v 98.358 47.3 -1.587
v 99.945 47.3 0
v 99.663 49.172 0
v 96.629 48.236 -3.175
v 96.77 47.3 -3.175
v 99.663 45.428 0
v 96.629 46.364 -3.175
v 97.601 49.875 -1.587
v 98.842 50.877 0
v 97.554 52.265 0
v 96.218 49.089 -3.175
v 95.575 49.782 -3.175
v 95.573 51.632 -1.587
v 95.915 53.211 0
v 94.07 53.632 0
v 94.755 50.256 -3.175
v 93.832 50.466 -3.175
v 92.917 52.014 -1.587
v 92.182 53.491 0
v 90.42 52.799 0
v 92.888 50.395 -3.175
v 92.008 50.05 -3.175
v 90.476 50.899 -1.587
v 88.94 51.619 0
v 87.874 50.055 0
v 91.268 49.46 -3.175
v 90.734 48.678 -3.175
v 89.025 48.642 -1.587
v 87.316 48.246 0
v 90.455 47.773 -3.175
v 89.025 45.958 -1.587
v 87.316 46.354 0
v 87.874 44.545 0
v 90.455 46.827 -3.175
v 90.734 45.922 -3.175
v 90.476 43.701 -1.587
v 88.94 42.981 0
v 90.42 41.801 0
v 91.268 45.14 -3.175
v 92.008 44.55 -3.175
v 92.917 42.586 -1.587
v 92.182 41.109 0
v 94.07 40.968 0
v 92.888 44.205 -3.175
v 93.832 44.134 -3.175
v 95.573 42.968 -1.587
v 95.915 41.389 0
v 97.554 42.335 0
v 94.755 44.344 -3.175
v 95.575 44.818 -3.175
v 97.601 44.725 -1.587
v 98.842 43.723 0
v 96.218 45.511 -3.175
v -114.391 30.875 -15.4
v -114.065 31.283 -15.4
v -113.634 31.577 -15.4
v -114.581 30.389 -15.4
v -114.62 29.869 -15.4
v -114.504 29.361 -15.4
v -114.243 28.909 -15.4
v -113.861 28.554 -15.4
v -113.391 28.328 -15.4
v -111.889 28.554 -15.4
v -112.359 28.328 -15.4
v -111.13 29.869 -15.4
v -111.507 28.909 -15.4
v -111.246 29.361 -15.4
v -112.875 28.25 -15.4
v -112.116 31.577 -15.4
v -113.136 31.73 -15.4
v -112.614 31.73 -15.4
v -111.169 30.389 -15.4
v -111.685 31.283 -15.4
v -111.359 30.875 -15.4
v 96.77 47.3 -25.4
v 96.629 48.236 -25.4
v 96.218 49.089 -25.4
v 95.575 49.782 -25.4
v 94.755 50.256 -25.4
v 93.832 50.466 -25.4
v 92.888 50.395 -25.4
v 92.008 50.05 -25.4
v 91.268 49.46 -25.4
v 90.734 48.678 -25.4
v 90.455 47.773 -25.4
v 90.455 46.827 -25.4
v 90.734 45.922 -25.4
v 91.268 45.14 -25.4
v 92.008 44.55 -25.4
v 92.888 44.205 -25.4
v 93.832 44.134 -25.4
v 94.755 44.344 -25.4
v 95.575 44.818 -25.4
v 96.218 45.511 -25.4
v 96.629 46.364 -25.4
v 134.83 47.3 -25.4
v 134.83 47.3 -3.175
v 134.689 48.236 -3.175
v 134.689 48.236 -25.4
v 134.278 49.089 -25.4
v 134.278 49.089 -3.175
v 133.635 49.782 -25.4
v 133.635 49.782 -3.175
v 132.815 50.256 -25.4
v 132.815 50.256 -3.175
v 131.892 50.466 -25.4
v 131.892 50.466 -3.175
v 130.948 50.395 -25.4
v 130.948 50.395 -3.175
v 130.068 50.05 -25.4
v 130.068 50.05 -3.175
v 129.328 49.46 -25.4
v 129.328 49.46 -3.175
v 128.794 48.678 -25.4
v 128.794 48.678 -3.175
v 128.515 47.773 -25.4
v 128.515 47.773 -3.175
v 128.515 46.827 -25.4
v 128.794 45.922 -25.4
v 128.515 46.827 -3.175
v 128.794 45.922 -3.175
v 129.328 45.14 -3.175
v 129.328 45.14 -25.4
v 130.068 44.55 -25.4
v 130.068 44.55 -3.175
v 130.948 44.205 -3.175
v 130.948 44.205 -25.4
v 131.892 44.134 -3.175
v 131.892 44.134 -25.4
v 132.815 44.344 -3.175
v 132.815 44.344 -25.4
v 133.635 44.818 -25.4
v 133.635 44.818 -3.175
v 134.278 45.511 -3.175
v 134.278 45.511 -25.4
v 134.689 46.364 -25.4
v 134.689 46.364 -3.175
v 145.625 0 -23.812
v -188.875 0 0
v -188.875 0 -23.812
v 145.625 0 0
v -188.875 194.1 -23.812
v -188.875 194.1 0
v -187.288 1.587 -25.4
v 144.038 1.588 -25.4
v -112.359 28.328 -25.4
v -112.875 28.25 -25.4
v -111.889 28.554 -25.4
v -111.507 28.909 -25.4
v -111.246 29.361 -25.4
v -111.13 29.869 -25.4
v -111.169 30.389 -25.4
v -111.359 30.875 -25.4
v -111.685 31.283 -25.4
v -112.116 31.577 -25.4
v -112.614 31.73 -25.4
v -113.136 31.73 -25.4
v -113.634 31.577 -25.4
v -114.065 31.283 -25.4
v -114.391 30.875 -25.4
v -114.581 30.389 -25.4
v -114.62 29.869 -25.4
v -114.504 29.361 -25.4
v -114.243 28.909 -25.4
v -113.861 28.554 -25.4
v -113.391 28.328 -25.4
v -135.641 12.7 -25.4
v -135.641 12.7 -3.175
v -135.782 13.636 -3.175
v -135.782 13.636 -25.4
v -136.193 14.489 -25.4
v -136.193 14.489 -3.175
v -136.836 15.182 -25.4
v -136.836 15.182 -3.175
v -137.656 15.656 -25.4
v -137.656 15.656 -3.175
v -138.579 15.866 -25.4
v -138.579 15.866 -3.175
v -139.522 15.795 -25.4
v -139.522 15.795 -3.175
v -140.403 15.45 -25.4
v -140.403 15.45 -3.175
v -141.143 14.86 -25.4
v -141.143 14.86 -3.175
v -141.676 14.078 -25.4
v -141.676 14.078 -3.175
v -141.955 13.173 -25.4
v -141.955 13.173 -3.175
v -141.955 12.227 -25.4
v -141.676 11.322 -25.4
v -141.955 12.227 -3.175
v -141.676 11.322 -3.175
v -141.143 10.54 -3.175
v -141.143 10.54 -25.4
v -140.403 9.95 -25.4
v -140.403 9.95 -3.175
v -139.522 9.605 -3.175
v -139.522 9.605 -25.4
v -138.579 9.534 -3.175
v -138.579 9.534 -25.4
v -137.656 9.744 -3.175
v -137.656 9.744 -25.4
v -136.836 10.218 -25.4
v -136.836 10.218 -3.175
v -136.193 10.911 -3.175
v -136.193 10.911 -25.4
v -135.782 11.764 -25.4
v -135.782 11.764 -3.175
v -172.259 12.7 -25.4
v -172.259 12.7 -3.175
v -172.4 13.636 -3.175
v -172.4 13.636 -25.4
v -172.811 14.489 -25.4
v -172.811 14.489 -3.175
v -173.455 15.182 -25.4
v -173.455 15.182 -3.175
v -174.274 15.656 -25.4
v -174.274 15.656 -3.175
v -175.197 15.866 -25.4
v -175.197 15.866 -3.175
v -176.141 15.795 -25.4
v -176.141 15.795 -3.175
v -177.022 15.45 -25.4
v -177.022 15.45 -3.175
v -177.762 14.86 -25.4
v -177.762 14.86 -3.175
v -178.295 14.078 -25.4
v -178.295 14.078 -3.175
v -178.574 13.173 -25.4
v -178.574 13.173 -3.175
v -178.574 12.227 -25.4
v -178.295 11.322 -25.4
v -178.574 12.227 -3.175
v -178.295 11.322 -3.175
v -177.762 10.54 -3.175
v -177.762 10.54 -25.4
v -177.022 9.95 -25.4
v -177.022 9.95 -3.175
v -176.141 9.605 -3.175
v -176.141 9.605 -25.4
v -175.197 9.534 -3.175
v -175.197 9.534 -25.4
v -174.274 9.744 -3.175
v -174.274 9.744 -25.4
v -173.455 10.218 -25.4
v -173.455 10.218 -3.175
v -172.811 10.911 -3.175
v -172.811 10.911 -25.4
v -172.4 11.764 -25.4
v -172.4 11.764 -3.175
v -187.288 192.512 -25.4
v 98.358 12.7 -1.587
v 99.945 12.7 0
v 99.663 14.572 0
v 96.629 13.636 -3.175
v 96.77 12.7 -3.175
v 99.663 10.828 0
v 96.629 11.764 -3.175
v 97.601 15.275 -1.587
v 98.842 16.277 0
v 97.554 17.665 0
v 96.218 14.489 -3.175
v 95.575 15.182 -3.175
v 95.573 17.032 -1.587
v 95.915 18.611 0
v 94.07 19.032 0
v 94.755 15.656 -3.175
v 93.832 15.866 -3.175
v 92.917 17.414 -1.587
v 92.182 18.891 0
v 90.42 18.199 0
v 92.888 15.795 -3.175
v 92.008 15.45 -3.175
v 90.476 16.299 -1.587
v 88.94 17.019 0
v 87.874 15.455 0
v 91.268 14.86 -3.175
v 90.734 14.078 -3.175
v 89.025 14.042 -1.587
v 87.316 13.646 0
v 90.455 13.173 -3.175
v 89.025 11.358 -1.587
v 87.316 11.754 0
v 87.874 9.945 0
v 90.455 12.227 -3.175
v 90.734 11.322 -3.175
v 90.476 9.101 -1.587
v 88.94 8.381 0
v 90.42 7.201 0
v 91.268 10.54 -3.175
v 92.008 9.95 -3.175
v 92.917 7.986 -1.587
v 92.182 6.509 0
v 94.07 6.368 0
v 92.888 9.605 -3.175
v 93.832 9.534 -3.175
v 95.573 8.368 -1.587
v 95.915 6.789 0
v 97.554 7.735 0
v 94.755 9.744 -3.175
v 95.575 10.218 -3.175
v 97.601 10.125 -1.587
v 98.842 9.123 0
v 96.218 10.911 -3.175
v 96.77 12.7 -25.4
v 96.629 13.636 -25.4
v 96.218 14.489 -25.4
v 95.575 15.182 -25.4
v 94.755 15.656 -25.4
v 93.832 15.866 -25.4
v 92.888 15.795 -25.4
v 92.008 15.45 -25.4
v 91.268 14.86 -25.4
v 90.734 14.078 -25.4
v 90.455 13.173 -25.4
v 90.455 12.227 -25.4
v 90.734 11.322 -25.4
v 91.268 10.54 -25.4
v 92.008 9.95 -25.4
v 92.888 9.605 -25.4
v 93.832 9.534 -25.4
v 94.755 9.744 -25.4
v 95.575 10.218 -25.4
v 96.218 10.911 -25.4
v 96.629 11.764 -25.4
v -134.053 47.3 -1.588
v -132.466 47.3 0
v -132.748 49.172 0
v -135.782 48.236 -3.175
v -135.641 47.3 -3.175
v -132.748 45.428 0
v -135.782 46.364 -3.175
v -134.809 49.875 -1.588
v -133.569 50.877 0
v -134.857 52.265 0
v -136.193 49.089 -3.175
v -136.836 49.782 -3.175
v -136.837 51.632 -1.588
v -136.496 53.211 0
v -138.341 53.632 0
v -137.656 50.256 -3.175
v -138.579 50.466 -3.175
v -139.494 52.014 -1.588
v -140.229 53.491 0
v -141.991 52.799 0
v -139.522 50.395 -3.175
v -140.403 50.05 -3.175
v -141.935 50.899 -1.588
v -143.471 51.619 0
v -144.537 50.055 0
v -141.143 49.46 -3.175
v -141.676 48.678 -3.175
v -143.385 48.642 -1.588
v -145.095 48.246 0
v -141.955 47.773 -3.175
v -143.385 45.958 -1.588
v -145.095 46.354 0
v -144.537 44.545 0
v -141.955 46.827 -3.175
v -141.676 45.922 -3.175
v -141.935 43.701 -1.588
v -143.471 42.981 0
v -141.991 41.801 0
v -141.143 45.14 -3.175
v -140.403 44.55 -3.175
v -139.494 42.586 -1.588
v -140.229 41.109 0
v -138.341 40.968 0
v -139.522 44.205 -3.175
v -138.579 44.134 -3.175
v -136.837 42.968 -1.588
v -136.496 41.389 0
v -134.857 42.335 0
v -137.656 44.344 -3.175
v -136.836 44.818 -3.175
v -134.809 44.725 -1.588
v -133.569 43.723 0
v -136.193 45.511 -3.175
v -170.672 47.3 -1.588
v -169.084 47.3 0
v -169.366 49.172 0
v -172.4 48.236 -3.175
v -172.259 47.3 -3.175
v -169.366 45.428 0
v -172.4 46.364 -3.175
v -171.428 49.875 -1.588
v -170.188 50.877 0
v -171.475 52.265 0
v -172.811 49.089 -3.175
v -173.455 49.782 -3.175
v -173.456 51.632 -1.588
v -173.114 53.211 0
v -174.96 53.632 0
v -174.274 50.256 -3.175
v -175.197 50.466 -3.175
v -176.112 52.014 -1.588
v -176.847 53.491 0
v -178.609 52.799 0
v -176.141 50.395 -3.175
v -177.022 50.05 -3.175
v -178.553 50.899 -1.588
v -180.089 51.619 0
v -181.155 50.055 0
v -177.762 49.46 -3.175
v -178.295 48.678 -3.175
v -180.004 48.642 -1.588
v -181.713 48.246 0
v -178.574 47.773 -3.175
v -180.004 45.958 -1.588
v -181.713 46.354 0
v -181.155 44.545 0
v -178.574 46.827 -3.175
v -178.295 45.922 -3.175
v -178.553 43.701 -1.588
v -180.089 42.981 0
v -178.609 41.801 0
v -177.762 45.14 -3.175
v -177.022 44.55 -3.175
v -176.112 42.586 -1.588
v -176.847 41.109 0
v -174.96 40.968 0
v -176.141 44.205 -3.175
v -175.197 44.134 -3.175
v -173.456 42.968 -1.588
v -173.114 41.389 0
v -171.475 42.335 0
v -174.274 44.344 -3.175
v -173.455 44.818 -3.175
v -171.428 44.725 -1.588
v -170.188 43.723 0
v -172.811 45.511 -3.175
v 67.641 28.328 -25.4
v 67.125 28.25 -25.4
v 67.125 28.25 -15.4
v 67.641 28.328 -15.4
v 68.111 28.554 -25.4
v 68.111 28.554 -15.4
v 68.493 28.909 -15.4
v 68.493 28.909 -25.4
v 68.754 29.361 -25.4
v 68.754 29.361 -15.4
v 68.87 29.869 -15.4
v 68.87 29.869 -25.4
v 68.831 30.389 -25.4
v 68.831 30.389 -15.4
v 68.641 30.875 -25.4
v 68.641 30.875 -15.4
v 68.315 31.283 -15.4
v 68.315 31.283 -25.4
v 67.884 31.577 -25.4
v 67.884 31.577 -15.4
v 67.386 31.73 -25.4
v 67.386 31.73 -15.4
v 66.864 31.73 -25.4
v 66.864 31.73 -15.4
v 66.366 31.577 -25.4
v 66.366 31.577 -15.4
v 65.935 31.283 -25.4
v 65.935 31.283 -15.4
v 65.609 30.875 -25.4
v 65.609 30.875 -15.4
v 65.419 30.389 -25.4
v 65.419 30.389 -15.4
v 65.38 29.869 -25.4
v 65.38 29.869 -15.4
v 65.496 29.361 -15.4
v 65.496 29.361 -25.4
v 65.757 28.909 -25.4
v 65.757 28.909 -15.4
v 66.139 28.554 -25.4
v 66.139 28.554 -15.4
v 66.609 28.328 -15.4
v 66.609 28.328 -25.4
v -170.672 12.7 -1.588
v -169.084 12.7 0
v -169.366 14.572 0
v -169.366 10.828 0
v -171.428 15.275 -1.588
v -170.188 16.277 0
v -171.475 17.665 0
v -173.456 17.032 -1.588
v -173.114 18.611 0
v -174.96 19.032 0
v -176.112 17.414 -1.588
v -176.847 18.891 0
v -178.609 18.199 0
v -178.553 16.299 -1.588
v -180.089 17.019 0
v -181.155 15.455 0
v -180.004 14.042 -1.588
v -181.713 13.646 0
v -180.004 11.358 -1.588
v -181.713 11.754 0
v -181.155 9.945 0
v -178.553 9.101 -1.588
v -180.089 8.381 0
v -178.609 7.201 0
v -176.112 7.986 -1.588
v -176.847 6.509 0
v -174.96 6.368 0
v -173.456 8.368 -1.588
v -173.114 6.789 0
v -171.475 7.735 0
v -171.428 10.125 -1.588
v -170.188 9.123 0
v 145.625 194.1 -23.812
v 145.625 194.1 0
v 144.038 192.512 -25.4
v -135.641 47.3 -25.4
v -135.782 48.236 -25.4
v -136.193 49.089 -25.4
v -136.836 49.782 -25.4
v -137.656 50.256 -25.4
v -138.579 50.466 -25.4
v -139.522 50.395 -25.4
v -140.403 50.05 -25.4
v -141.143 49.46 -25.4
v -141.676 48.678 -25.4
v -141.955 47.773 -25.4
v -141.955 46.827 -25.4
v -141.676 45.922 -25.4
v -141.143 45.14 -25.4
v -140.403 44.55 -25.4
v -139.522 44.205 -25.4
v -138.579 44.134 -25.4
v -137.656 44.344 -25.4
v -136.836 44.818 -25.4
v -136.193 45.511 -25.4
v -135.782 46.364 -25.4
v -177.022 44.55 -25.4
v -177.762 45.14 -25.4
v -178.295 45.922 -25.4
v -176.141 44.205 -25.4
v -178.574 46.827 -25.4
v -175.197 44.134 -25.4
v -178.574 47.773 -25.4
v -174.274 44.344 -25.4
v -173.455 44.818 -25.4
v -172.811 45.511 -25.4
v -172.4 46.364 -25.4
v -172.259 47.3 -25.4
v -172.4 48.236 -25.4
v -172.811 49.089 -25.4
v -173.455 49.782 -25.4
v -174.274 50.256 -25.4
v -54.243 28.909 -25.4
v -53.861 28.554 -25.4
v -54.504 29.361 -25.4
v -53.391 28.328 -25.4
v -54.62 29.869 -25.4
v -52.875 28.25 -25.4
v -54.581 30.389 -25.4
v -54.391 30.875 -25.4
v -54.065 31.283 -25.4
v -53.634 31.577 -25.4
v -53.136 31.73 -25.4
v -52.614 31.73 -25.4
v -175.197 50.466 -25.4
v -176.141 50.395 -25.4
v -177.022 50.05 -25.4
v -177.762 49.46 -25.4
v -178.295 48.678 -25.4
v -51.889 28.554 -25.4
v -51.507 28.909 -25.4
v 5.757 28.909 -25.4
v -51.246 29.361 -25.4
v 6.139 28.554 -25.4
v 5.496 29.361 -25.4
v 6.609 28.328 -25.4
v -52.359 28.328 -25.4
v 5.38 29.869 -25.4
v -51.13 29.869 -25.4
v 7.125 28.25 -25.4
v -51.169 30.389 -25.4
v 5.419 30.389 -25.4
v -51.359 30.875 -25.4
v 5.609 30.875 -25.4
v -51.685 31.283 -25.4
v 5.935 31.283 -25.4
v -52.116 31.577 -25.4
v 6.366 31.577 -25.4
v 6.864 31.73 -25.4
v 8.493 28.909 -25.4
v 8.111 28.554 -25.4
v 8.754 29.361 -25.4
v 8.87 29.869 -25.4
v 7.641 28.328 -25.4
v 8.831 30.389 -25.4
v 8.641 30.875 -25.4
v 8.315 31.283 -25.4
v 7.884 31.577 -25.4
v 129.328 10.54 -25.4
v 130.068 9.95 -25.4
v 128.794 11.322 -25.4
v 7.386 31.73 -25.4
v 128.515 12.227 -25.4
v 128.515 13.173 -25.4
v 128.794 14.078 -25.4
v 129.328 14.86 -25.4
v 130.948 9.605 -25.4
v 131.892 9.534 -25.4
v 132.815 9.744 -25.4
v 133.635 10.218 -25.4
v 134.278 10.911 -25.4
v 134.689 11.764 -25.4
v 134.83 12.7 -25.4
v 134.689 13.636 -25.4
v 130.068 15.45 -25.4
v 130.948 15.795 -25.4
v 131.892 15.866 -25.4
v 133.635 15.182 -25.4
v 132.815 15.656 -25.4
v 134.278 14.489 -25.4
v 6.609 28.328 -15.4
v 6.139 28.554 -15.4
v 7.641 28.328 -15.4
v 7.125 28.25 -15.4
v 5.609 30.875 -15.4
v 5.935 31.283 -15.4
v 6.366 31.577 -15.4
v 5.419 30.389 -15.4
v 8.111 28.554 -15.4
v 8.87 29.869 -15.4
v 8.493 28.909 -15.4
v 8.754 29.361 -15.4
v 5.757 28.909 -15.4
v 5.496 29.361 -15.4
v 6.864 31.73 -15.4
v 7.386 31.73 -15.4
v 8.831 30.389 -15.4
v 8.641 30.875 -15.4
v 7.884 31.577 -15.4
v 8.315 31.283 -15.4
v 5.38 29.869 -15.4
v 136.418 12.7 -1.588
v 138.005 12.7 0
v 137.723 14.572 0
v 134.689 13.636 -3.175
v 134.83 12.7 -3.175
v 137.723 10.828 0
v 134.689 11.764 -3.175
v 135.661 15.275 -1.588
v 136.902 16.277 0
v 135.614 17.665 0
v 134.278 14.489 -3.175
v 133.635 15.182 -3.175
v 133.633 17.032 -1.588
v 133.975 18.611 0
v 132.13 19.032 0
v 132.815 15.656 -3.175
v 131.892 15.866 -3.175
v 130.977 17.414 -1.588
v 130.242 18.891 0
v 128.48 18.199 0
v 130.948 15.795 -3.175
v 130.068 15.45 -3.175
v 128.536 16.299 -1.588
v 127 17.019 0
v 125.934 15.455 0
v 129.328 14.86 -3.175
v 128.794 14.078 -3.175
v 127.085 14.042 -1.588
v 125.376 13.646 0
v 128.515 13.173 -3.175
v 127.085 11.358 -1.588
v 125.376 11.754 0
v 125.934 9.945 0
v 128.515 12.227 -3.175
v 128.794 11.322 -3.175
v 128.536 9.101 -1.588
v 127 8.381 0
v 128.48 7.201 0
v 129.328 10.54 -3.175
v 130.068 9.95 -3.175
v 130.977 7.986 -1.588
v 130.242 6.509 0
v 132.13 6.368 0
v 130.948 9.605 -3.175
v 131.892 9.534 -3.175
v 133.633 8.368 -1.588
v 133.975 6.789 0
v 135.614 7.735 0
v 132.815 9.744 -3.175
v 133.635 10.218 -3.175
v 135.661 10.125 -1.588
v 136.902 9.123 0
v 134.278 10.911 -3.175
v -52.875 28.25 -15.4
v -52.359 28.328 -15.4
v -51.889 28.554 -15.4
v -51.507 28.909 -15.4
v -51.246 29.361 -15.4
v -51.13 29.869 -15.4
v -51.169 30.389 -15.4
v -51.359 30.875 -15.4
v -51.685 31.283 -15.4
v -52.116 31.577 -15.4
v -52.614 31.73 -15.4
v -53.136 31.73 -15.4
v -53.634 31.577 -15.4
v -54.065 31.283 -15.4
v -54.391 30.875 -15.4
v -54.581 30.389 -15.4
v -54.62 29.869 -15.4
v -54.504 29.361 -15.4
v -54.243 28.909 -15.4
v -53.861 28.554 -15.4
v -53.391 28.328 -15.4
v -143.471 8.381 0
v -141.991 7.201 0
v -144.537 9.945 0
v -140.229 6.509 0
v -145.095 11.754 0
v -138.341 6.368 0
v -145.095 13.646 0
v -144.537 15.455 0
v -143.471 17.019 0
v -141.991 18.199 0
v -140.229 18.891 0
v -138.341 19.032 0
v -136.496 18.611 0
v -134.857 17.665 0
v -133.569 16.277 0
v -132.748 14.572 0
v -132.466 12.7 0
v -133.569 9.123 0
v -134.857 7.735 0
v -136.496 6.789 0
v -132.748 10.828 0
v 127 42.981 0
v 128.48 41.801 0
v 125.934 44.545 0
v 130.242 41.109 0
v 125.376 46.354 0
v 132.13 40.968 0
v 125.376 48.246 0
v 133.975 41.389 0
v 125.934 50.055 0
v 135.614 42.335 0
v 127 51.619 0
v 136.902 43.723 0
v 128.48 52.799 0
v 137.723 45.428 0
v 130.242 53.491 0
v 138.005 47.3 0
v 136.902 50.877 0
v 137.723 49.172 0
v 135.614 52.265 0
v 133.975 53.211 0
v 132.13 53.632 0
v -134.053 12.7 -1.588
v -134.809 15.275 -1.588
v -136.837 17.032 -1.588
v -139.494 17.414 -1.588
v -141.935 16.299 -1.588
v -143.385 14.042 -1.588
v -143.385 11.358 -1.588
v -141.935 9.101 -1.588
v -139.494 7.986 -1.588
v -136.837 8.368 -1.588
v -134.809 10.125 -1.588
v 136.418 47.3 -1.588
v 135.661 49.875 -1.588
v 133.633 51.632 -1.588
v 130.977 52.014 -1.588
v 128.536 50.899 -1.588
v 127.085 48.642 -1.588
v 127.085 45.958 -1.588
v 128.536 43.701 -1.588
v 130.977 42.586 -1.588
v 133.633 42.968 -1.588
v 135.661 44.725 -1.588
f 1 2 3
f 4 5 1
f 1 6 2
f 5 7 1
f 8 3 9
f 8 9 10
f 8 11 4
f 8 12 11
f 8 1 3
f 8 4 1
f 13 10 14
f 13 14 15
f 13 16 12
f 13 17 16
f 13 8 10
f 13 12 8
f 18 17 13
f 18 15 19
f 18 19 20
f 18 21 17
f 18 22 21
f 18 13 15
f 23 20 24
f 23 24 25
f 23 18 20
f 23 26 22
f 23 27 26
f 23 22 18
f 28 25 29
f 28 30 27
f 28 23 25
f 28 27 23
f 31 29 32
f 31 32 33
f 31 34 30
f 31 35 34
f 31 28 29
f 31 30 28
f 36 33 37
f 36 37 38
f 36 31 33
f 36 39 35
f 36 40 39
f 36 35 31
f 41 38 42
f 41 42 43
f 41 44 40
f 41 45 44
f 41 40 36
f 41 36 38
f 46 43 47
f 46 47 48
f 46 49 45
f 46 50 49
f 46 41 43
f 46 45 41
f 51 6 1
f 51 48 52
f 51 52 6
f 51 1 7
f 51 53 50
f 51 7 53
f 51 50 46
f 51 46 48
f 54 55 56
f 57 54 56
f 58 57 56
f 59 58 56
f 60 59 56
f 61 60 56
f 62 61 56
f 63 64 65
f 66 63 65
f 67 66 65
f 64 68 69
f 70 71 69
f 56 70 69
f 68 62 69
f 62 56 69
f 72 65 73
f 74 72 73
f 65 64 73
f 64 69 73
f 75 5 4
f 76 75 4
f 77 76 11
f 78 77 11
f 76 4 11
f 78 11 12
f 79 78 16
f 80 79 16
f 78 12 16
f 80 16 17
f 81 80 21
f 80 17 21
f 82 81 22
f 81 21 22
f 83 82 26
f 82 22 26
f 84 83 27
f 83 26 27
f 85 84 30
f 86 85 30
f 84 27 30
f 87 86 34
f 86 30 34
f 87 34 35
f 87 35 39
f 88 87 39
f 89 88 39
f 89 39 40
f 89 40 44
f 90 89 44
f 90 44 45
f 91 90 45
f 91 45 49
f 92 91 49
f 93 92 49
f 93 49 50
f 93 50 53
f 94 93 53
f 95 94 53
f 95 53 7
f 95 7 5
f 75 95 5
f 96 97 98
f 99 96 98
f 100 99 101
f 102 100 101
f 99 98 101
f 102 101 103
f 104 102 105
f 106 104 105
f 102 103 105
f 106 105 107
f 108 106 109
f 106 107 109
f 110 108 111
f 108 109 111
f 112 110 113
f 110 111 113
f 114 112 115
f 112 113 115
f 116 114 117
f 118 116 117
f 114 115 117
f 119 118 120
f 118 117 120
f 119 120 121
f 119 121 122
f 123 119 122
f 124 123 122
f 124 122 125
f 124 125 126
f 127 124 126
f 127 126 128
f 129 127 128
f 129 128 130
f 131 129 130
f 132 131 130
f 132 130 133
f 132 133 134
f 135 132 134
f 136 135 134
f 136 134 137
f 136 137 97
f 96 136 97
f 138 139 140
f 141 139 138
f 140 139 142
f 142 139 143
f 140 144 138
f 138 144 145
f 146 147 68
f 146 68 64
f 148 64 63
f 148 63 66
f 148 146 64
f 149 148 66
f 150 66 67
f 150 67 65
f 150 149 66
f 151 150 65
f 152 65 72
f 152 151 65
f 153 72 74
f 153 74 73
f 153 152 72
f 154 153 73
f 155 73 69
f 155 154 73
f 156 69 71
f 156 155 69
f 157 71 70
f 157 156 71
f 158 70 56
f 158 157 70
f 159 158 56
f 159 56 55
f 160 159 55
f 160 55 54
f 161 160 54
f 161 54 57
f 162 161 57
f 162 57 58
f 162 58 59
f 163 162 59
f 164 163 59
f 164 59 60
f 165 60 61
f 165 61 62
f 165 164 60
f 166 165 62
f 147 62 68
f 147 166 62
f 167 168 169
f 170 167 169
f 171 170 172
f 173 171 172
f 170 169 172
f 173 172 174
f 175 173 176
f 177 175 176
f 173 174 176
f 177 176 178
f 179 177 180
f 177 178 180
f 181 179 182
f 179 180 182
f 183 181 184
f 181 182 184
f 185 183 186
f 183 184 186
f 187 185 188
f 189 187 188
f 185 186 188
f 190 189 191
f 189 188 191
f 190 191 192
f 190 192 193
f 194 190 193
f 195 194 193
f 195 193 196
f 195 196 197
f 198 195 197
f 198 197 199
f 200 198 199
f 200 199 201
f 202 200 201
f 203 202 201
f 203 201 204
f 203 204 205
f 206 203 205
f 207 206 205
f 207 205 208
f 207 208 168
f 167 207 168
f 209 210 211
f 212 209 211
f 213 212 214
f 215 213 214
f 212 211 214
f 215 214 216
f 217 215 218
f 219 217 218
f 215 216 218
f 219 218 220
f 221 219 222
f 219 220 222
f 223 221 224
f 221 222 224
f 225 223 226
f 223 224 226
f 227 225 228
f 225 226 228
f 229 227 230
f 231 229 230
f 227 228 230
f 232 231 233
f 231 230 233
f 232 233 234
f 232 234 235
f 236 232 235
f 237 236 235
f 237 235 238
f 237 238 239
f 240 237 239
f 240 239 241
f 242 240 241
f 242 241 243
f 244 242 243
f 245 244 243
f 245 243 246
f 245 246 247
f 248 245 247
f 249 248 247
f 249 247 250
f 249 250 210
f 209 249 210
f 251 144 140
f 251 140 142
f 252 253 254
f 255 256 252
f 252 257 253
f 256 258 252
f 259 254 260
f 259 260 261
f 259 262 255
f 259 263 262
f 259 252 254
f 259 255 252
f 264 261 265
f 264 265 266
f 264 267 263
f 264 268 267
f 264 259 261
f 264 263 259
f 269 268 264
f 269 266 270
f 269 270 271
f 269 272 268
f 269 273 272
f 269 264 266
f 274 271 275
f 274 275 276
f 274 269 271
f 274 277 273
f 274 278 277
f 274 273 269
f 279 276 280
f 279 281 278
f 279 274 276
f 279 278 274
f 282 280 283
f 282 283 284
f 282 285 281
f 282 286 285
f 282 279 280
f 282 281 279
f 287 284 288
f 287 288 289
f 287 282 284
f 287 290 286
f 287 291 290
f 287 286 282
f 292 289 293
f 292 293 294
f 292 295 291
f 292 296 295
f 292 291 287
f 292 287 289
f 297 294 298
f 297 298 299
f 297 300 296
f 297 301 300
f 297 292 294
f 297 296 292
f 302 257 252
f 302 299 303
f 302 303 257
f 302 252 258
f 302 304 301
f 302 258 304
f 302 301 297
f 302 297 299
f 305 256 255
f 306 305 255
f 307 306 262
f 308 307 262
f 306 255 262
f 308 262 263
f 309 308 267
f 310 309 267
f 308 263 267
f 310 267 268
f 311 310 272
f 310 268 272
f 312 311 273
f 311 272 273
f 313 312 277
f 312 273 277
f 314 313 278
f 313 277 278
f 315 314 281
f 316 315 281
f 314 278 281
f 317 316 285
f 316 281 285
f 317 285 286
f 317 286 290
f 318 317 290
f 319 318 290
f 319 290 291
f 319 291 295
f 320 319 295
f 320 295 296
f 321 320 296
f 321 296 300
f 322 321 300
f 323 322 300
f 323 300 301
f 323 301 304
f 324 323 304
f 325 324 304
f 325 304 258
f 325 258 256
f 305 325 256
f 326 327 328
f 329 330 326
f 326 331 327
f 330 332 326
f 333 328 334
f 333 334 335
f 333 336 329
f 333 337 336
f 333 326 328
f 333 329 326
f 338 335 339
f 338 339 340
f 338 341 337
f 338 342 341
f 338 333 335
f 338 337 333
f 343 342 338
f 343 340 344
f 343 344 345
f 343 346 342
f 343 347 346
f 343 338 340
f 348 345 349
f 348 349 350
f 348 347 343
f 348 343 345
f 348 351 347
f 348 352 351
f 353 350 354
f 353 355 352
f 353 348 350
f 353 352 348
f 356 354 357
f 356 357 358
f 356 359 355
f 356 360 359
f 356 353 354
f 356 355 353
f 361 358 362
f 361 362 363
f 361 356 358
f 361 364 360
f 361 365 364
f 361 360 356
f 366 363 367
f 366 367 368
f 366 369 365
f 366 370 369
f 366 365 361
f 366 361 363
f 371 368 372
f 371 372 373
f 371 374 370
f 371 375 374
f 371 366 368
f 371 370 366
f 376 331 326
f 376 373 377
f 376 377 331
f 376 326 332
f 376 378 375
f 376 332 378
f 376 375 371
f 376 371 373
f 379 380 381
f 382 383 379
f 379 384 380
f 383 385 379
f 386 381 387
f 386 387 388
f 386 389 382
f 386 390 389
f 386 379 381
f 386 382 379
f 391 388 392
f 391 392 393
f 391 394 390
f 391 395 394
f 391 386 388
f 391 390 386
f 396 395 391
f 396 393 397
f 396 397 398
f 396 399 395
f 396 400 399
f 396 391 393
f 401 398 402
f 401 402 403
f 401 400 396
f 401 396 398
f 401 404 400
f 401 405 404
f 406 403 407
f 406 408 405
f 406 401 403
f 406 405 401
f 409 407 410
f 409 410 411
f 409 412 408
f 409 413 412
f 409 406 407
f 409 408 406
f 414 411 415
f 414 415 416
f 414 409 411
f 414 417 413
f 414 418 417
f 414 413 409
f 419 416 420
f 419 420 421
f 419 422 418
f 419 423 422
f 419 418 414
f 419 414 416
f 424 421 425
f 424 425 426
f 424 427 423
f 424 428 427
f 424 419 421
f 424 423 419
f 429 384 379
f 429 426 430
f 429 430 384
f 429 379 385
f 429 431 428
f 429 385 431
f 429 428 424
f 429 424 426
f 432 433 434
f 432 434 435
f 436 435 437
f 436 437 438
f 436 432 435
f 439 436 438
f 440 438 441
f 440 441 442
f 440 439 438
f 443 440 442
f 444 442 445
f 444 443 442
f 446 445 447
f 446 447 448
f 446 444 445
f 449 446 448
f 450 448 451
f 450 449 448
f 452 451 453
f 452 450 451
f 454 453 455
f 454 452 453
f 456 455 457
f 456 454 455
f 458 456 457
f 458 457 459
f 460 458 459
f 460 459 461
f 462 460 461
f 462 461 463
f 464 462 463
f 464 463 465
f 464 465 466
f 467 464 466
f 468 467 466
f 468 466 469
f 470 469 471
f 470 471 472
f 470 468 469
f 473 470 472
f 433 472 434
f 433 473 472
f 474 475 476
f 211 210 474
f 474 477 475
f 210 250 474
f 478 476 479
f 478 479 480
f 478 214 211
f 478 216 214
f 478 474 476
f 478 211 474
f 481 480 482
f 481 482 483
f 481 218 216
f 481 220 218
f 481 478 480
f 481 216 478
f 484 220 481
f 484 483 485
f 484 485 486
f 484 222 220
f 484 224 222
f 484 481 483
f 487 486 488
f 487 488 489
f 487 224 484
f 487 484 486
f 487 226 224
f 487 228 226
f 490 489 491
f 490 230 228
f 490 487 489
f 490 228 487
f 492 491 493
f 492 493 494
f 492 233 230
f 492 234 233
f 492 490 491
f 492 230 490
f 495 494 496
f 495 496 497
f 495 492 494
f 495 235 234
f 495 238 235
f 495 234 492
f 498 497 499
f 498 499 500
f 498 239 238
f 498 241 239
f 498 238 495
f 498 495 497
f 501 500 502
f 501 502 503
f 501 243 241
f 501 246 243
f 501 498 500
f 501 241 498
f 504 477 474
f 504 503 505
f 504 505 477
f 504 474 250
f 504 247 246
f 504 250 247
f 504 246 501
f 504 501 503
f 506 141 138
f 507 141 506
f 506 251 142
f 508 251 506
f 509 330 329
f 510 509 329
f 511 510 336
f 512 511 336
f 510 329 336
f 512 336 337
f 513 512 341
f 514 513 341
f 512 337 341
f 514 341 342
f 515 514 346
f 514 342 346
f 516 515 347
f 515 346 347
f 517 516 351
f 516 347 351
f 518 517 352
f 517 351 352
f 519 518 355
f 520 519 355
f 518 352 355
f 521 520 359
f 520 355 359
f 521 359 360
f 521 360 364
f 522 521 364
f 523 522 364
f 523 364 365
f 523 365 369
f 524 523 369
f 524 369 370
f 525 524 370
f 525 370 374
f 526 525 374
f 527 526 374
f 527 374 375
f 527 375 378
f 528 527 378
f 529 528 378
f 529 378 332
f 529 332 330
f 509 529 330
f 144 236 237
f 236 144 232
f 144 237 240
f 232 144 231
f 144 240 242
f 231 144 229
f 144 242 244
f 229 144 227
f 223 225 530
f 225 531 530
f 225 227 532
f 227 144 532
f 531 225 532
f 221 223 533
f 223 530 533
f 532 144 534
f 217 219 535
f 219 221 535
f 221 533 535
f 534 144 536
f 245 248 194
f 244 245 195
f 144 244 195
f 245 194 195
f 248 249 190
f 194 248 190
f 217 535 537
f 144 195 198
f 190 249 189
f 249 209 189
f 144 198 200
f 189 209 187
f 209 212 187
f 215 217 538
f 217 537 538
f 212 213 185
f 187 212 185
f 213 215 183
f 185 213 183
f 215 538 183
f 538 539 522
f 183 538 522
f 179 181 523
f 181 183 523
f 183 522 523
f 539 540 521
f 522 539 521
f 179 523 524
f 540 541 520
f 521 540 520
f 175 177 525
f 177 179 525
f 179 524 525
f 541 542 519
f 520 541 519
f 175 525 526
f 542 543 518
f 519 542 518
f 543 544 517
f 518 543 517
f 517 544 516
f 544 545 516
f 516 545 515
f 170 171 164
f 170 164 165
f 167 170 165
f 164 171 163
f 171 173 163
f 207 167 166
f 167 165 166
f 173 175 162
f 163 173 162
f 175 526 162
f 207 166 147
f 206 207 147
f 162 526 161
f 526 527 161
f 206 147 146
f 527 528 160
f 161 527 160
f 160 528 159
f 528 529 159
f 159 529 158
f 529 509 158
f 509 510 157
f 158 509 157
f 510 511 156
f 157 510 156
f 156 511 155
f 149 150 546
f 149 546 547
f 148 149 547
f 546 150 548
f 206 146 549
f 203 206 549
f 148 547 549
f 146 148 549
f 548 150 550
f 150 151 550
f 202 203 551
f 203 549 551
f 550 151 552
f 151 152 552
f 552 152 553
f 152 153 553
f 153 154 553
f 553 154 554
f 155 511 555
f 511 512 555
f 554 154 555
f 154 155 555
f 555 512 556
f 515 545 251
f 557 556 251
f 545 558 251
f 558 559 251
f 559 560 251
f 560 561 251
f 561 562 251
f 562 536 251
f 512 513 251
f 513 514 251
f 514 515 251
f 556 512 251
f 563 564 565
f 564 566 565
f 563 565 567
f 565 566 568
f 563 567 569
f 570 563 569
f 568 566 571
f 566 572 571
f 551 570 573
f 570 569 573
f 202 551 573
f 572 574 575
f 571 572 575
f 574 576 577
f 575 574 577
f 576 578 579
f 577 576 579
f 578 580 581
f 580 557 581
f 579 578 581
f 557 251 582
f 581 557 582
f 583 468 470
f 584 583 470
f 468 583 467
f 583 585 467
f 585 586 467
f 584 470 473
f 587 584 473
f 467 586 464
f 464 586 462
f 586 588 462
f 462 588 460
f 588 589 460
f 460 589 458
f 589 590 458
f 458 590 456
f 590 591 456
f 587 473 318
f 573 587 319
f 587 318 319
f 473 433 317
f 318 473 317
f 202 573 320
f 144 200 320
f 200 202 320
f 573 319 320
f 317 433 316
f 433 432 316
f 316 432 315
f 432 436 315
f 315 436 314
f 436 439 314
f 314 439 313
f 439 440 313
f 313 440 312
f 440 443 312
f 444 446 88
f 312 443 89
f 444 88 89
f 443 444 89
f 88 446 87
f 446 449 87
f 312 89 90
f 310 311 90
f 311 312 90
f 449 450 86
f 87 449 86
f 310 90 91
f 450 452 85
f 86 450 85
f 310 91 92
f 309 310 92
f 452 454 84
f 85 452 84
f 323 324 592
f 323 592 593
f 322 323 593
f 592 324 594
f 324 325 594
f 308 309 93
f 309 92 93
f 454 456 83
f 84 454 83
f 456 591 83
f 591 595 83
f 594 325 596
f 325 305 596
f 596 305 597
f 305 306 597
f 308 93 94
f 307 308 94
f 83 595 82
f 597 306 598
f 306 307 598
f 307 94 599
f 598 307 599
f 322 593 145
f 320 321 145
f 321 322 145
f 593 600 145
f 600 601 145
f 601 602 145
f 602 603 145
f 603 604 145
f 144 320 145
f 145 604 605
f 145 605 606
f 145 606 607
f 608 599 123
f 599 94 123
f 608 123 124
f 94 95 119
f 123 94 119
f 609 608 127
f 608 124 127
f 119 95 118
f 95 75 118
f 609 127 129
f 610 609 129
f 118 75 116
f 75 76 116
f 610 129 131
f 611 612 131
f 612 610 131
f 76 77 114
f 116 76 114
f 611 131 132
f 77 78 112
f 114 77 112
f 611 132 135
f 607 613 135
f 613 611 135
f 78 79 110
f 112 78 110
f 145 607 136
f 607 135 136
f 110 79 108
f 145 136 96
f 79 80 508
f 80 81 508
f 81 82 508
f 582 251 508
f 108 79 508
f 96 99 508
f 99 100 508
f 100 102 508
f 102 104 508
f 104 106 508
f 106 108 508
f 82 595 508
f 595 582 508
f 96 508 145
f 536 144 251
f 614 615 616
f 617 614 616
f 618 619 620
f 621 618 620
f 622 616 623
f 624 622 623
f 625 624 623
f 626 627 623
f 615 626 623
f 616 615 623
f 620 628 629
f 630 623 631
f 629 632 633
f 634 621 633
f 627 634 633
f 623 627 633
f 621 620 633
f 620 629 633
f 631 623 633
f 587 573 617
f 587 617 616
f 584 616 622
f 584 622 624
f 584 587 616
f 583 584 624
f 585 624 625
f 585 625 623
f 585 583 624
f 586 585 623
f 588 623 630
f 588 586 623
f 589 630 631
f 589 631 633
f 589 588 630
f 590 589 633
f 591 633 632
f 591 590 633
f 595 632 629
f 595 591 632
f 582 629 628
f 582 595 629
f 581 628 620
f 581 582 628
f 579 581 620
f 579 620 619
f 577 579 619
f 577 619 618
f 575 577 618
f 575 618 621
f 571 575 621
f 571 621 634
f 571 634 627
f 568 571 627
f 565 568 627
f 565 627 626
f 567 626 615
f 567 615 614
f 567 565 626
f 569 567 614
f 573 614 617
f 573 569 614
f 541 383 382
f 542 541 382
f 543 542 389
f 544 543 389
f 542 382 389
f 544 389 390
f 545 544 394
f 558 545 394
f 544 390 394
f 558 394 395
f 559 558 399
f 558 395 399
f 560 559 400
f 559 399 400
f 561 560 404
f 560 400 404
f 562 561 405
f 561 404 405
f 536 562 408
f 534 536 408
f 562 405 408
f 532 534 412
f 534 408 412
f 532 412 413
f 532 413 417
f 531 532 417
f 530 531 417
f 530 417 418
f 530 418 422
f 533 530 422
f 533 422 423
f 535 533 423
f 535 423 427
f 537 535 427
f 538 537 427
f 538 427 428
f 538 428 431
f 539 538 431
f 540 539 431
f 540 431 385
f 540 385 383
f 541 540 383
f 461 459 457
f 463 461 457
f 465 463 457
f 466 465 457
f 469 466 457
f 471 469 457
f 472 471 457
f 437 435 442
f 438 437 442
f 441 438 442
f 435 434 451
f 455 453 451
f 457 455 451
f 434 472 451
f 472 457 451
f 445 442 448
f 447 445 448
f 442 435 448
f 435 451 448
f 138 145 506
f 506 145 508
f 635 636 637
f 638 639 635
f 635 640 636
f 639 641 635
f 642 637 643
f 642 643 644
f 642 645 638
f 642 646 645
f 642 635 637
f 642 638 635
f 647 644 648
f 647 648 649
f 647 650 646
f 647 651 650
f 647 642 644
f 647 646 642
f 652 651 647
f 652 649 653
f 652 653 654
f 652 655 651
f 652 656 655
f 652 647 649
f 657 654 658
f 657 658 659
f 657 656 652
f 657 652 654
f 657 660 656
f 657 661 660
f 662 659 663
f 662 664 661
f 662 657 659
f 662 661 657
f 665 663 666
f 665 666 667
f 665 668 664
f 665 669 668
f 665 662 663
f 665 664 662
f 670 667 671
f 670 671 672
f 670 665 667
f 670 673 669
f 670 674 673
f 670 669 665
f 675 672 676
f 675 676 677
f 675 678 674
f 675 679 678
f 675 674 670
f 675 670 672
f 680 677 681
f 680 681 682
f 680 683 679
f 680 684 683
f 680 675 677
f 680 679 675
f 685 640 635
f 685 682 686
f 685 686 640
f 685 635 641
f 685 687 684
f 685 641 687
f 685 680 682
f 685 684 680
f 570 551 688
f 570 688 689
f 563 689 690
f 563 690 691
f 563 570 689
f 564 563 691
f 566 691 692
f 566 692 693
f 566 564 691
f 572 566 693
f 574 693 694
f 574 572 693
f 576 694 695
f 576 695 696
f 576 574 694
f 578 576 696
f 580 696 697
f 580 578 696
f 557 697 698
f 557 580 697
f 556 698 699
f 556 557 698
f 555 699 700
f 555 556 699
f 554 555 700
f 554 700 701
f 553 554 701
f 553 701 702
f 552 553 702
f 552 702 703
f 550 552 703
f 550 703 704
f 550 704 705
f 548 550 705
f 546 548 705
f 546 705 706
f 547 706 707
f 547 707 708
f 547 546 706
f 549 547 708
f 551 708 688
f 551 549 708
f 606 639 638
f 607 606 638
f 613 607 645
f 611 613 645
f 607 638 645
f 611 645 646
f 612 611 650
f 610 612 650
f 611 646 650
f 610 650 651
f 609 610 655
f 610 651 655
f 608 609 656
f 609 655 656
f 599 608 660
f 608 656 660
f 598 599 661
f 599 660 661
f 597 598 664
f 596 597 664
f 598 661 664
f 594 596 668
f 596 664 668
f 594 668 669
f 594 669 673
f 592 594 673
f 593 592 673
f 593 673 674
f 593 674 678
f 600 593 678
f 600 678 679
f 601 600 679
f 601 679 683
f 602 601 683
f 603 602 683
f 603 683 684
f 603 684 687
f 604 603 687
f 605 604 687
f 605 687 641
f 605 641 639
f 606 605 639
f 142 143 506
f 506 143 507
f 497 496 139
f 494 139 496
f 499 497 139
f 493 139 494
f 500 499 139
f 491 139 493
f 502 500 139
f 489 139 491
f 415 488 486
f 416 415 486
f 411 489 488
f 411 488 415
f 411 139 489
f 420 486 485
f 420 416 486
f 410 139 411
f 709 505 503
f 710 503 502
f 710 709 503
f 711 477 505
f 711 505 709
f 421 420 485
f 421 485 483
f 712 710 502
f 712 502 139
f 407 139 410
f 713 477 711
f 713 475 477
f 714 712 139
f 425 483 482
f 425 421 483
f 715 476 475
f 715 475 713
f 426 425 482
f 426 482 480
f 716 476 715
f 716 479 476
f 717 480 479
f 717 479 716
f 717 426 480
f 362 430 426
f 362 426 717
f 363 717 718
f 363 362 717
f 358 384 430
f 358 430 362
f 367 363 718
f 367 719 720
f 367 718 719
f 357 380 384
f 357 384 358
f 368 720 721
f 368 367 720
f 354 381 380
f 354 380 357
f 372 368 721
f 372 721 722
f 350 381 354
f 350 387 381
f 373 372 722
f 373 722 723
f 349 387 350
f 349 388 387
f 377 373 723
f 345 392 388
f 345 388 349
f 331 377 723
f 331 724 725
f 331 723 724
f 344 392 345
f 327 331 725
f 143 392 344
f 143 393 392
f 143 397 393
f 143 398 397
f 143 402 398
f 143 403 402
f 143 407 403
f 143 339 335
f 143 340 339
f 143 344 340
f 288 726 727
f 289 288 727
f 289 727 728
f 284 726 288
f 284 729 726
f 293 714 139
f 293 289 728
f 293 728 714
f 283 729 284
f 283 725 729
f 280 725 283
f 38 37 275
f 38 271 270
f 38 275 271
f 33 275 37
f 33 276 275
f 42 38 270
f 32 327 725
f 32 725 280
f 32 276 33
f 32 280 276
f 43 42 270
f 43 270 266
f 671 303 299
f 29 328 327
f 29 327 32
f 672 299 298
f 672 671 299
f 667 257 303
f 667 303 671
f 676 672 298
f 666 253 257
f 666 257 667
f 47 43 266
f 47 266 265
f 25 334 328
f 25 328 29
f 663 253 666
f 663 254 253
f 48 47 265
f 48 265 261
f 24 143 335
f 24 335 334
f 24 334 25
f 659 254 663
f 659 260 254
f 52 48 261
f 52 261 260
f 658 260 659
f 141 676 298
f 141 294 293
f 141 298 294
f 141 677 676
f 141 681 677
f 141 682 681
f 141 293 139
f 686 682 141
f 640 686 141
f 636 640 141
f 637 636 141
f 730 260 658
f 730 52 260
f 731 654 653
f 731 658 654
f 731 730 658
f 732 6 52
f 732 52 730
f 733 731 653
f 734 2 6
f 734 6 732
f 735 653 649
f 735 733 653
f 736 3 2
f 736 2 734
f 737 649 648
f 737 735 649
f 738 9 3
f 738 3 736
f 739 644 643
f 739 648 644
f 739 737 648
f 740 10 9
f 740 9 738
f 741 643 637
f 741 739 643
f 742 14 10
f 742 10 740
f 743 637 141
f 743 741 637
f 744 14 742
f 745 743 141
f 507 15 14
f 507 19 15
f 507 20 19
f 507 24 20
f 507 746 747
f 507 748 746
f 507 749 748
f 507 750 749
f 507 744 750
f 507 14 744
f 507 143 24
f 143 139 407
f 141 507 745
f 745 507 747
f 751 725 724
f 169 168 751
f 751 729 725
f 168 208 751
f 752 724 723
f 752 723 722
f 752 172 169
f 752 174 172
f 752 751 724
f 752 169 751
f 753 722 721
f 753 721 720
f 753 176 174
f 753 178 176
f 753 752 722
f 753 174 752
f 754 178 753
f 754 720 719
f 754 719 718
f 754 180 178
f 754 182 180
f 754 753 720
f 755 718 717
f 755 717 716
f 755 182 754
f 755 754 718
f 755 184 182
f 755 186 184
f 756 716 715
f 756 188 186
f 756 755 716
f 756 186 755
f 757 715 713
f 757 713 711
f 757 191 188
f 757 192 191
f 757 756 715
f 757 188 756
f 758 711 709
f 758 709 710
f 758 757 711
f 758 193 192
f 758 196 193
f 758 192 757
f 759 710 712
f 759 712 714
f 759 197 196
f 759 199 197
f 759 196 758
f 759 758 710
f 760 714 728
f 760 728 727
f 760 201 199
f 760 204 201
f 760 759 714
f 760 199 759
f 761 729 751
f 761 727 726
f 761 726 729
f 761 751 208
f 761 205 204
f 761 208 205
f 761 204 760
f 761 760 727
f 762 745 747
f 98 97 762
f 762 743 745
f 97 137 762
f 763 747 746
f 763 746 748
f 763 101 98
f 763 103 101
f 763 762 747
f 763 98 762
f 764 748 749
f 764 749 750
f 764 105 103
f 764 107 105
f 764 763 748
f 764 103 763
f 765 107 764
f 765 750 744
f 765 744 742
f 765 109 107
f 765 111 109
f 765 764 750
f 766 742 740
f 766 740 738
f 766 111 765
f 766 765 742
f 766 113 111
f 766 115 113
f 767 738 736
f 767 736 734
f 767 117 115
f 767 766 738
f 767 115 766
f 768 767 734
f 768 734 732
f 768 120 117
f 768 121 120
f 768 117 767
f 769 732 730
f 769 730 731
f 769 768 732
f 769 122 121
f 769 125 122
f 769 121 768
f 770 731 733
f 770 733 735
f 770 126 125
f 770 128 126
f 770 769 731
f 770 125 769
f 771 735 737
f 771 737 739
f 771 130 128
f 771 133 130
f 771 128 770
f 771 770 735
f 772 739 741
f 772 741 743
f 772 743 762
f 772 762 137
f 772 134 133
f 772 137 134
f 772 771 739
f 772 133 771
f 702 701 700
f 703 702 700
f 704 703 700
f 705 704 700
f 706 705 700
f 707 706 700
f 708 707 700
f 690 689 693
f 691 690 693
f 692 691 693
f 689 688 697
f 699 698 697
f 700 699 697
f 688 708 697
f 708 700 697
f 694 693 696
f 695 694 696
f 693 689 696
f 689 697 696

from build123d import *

# Parameters (mm, degrees)
SKETCH2_W               = 334.5
SKETCH2_H               = 194.1
PRIMARY_EXTRUSION_DEPTH = 25.4
RAIL_START              = -25.4
RAIL_MOUNTING_DEPTH     = 10
SKETCH3_R               = 3.175
CUT_EXTRUDE2_DEPTH      = 26.4
CHAMFER1_SIZE           = 3.175
CHAMFER2_SIZE           = 1.5875


with BuildPart() as part:
    # Sketch2 → Primary Extrusion (new body)
    with BuildSketch(Plane.XY):
        with Locations((-21.625, 97.05)):
            Rectangle(SKETCH2_W, SKETCH2_H)
    extrude(amount=-PRIMARY_EXTRUSION_DEPTH)

    # Sketch2<3> → Rail Mounting (cut)
    with BuildSketch(Plane.XY.offset(RAIL_START)):
        with BuildLine():
            ThreePointArc((-112.875, 31.75), (-114.625, 30), (-112.875, 28.25))
            ThreePointArc((-112.875, 28.25), (-111.125, 30), (-112.875, 31.75))
        make_face()
        with BuildLine():
            ThreePointArc((-52.875, 31.75), (-54.625, 30), (-52.875, 28.25))
            ThreePointArc((-52.875, 28.25), (-51.125, 30), (-52.875, 31.75))
        make_face()
        with BuildLine():
            ThreePointArc((7.125, 31.75), (5.375, 30), (7.125, 28.25))
            ThreePointArc((7.125, 28.25), (8.875, 30), (7.125, 31.75))
        make_face()
        with BuildLine():
            ThreePointArc((67.125, 31.75), (65.375, 30), (67.125, 28.25))
            ThreePointArc((67.125, 28.25), (68.875, 30), (67.125, 31.75))
        make_face()
    extrude(amount=RAIL_MOUNTING_DEPTH, mode=Mode.SUBTRACT)

    # Sketch3 → Cut-Extrude2 (cut, through all)
    with BuildSketch(Plane.XY):
        with Locations((-138.815833333, 47.3)):
            Circle(SKETCH3_R)
        with Locations((-138.815833333, 12.7)):
            Circle(SKETCH3_R)
        with Locations((93.595, 47.3)):
            Circle(SKETCH3_R)
        with Locations((131.655, 47.3)):
            Circle(SKETCH3_R)
        with Locations((131.655, 12.7)):
            Circle(SKETCH3_R)
        with Locations((93.595, 12.7)):
            Circle(SKETCH3_R)
        with Locations((-175.434166667, 12.7)):
            Circle(SKETCH3_R)
        with Locations((-175.434166667, 47.3)):
            Circle(SKETCH3_R)
    extrude(amount=-CUT_EXTRUDE2_DEPTH, mode=Mode.SUBTRACT)

    # Chamfer1
    chamfer1_edges = [part.edges().sort_by_distance(p)[0] for p in [
        (128.48, 12.7, 0),
        (90.42, 47.3, 0),
        (128.48, 47.3, 0),
        (-141.990833333, 12.7, 0),
        (90.42, 12.7, 0),
        (-178.609166667, 12.7, 0),
        (-178.609166667, 47.3, 0),
        (-141.990833333, 47.3, 0),
    ]]
    chamfer(chamfer1_edges, length=CHAMFER1_SIZE)

    # Chamfer2
    chamfer2_edges = [part.edges().sort_by_distance(p)[0] for p in [
        (-21.625, 0, -25.4),
        (145.625, 97.05, -25.4),
        (-21.625, 194.1, -25.4),
        (-188.875, 97.05, -25.4),
    ]]
    chamfer(chamfer2_edges, length=CHAMFER2_SIZE)


solid = part.part
